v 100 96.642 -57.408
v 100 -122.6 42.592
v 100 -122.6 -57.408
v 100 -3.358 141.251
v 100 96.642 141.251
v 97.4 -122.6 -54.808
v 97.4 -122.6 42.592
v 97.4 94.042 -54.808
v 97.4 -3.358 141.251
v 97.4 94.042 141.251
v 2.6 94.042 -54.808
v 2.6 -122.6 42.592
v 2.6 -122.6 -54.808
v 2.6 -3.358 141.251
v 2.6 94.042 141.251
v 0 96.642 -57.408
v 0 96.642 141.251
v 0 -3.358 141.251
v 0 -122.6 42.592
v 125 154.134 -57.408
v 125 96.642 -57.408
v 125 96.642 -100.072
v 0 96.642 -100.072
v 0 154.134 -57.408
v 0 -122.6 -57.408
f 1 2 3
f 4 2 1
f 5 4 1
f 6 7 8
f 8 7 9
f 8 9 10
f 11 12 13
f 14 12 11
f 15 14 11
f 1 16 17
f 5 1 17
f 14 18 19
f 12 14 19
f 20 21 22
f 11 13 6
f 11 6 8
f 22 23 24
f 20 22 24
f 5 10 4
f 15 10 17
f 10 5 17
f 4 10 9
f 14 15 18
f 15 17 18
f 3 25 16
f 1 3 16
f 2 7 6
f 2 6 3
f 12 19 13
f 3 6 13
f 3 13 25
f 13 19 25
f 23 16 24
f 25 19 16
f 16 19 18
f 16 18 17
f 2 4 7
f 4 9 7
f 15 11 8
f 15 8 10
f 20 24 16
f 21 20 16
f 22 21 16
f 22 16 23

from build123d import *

# Parameters (mm, degrees)
F1_DEPTH = 25
F2_DEPTH = 100
F3_DEPTH = 25
F4_T     = -2.6


with BuildPart() as f1:
    # F0 (on Right) → F1 (new body)
    with BuildSketch(Plane.YZ):
        Polygon((-122.6000512926, 42.5921416433), (-122.6000512926, -57.4078583567), (96.6418987055, -57.4078583567), (96.6418987055, 141.2506547058), (-3.3581012945, 141.2506547058), align=None)
    extrude(amount=F1_DEPTH)

    # F0 (on Right) → F2 (join)
    with BuildSketch(Plane.YZ):
        Polygon((-122.6000512926, 42.5921416433), (-122.6000512926, -57.4078583567), (96.6418987055, -57.4078583567), (96.6418987055, 141.2506547058), (-3.3581012945, 141.2506547058), align=None)
    extrude(amount=F2_DEPTH)

    # F4
    f4_openings = [f1.faces().sort_by_distance(p)[0] for p in [
        (50, 46.641899, 141.250655),
        (50, -62.979076, 91.921398),
        (50, -122.600051, -7.407858),
    ]]
    offset(amount=F4_T, openings=f4_openings)


with BuildPart() as f2:
    # F0 (on Right) → F2, piece 2 (new body)
    with BuildSketch(Plane.YZ):
        Polygon((154.1335378966, -57.4078583567), (96.6418987055, -57.4078583567), (96.6418987055, -100.0723155335), align=None)
    extrude(amount=F2_DEPTH)

    # F3 (add): a face of the model
    f3_faces = [f2.faces().sort_by_distance(p)[0] for p in [
        (100, 115.8057784359, -71.6293440823),
    ]]
    extrude(f3_faces, amount=F3_DEPTH)


solid = Compound([f1.part, f2.part])
